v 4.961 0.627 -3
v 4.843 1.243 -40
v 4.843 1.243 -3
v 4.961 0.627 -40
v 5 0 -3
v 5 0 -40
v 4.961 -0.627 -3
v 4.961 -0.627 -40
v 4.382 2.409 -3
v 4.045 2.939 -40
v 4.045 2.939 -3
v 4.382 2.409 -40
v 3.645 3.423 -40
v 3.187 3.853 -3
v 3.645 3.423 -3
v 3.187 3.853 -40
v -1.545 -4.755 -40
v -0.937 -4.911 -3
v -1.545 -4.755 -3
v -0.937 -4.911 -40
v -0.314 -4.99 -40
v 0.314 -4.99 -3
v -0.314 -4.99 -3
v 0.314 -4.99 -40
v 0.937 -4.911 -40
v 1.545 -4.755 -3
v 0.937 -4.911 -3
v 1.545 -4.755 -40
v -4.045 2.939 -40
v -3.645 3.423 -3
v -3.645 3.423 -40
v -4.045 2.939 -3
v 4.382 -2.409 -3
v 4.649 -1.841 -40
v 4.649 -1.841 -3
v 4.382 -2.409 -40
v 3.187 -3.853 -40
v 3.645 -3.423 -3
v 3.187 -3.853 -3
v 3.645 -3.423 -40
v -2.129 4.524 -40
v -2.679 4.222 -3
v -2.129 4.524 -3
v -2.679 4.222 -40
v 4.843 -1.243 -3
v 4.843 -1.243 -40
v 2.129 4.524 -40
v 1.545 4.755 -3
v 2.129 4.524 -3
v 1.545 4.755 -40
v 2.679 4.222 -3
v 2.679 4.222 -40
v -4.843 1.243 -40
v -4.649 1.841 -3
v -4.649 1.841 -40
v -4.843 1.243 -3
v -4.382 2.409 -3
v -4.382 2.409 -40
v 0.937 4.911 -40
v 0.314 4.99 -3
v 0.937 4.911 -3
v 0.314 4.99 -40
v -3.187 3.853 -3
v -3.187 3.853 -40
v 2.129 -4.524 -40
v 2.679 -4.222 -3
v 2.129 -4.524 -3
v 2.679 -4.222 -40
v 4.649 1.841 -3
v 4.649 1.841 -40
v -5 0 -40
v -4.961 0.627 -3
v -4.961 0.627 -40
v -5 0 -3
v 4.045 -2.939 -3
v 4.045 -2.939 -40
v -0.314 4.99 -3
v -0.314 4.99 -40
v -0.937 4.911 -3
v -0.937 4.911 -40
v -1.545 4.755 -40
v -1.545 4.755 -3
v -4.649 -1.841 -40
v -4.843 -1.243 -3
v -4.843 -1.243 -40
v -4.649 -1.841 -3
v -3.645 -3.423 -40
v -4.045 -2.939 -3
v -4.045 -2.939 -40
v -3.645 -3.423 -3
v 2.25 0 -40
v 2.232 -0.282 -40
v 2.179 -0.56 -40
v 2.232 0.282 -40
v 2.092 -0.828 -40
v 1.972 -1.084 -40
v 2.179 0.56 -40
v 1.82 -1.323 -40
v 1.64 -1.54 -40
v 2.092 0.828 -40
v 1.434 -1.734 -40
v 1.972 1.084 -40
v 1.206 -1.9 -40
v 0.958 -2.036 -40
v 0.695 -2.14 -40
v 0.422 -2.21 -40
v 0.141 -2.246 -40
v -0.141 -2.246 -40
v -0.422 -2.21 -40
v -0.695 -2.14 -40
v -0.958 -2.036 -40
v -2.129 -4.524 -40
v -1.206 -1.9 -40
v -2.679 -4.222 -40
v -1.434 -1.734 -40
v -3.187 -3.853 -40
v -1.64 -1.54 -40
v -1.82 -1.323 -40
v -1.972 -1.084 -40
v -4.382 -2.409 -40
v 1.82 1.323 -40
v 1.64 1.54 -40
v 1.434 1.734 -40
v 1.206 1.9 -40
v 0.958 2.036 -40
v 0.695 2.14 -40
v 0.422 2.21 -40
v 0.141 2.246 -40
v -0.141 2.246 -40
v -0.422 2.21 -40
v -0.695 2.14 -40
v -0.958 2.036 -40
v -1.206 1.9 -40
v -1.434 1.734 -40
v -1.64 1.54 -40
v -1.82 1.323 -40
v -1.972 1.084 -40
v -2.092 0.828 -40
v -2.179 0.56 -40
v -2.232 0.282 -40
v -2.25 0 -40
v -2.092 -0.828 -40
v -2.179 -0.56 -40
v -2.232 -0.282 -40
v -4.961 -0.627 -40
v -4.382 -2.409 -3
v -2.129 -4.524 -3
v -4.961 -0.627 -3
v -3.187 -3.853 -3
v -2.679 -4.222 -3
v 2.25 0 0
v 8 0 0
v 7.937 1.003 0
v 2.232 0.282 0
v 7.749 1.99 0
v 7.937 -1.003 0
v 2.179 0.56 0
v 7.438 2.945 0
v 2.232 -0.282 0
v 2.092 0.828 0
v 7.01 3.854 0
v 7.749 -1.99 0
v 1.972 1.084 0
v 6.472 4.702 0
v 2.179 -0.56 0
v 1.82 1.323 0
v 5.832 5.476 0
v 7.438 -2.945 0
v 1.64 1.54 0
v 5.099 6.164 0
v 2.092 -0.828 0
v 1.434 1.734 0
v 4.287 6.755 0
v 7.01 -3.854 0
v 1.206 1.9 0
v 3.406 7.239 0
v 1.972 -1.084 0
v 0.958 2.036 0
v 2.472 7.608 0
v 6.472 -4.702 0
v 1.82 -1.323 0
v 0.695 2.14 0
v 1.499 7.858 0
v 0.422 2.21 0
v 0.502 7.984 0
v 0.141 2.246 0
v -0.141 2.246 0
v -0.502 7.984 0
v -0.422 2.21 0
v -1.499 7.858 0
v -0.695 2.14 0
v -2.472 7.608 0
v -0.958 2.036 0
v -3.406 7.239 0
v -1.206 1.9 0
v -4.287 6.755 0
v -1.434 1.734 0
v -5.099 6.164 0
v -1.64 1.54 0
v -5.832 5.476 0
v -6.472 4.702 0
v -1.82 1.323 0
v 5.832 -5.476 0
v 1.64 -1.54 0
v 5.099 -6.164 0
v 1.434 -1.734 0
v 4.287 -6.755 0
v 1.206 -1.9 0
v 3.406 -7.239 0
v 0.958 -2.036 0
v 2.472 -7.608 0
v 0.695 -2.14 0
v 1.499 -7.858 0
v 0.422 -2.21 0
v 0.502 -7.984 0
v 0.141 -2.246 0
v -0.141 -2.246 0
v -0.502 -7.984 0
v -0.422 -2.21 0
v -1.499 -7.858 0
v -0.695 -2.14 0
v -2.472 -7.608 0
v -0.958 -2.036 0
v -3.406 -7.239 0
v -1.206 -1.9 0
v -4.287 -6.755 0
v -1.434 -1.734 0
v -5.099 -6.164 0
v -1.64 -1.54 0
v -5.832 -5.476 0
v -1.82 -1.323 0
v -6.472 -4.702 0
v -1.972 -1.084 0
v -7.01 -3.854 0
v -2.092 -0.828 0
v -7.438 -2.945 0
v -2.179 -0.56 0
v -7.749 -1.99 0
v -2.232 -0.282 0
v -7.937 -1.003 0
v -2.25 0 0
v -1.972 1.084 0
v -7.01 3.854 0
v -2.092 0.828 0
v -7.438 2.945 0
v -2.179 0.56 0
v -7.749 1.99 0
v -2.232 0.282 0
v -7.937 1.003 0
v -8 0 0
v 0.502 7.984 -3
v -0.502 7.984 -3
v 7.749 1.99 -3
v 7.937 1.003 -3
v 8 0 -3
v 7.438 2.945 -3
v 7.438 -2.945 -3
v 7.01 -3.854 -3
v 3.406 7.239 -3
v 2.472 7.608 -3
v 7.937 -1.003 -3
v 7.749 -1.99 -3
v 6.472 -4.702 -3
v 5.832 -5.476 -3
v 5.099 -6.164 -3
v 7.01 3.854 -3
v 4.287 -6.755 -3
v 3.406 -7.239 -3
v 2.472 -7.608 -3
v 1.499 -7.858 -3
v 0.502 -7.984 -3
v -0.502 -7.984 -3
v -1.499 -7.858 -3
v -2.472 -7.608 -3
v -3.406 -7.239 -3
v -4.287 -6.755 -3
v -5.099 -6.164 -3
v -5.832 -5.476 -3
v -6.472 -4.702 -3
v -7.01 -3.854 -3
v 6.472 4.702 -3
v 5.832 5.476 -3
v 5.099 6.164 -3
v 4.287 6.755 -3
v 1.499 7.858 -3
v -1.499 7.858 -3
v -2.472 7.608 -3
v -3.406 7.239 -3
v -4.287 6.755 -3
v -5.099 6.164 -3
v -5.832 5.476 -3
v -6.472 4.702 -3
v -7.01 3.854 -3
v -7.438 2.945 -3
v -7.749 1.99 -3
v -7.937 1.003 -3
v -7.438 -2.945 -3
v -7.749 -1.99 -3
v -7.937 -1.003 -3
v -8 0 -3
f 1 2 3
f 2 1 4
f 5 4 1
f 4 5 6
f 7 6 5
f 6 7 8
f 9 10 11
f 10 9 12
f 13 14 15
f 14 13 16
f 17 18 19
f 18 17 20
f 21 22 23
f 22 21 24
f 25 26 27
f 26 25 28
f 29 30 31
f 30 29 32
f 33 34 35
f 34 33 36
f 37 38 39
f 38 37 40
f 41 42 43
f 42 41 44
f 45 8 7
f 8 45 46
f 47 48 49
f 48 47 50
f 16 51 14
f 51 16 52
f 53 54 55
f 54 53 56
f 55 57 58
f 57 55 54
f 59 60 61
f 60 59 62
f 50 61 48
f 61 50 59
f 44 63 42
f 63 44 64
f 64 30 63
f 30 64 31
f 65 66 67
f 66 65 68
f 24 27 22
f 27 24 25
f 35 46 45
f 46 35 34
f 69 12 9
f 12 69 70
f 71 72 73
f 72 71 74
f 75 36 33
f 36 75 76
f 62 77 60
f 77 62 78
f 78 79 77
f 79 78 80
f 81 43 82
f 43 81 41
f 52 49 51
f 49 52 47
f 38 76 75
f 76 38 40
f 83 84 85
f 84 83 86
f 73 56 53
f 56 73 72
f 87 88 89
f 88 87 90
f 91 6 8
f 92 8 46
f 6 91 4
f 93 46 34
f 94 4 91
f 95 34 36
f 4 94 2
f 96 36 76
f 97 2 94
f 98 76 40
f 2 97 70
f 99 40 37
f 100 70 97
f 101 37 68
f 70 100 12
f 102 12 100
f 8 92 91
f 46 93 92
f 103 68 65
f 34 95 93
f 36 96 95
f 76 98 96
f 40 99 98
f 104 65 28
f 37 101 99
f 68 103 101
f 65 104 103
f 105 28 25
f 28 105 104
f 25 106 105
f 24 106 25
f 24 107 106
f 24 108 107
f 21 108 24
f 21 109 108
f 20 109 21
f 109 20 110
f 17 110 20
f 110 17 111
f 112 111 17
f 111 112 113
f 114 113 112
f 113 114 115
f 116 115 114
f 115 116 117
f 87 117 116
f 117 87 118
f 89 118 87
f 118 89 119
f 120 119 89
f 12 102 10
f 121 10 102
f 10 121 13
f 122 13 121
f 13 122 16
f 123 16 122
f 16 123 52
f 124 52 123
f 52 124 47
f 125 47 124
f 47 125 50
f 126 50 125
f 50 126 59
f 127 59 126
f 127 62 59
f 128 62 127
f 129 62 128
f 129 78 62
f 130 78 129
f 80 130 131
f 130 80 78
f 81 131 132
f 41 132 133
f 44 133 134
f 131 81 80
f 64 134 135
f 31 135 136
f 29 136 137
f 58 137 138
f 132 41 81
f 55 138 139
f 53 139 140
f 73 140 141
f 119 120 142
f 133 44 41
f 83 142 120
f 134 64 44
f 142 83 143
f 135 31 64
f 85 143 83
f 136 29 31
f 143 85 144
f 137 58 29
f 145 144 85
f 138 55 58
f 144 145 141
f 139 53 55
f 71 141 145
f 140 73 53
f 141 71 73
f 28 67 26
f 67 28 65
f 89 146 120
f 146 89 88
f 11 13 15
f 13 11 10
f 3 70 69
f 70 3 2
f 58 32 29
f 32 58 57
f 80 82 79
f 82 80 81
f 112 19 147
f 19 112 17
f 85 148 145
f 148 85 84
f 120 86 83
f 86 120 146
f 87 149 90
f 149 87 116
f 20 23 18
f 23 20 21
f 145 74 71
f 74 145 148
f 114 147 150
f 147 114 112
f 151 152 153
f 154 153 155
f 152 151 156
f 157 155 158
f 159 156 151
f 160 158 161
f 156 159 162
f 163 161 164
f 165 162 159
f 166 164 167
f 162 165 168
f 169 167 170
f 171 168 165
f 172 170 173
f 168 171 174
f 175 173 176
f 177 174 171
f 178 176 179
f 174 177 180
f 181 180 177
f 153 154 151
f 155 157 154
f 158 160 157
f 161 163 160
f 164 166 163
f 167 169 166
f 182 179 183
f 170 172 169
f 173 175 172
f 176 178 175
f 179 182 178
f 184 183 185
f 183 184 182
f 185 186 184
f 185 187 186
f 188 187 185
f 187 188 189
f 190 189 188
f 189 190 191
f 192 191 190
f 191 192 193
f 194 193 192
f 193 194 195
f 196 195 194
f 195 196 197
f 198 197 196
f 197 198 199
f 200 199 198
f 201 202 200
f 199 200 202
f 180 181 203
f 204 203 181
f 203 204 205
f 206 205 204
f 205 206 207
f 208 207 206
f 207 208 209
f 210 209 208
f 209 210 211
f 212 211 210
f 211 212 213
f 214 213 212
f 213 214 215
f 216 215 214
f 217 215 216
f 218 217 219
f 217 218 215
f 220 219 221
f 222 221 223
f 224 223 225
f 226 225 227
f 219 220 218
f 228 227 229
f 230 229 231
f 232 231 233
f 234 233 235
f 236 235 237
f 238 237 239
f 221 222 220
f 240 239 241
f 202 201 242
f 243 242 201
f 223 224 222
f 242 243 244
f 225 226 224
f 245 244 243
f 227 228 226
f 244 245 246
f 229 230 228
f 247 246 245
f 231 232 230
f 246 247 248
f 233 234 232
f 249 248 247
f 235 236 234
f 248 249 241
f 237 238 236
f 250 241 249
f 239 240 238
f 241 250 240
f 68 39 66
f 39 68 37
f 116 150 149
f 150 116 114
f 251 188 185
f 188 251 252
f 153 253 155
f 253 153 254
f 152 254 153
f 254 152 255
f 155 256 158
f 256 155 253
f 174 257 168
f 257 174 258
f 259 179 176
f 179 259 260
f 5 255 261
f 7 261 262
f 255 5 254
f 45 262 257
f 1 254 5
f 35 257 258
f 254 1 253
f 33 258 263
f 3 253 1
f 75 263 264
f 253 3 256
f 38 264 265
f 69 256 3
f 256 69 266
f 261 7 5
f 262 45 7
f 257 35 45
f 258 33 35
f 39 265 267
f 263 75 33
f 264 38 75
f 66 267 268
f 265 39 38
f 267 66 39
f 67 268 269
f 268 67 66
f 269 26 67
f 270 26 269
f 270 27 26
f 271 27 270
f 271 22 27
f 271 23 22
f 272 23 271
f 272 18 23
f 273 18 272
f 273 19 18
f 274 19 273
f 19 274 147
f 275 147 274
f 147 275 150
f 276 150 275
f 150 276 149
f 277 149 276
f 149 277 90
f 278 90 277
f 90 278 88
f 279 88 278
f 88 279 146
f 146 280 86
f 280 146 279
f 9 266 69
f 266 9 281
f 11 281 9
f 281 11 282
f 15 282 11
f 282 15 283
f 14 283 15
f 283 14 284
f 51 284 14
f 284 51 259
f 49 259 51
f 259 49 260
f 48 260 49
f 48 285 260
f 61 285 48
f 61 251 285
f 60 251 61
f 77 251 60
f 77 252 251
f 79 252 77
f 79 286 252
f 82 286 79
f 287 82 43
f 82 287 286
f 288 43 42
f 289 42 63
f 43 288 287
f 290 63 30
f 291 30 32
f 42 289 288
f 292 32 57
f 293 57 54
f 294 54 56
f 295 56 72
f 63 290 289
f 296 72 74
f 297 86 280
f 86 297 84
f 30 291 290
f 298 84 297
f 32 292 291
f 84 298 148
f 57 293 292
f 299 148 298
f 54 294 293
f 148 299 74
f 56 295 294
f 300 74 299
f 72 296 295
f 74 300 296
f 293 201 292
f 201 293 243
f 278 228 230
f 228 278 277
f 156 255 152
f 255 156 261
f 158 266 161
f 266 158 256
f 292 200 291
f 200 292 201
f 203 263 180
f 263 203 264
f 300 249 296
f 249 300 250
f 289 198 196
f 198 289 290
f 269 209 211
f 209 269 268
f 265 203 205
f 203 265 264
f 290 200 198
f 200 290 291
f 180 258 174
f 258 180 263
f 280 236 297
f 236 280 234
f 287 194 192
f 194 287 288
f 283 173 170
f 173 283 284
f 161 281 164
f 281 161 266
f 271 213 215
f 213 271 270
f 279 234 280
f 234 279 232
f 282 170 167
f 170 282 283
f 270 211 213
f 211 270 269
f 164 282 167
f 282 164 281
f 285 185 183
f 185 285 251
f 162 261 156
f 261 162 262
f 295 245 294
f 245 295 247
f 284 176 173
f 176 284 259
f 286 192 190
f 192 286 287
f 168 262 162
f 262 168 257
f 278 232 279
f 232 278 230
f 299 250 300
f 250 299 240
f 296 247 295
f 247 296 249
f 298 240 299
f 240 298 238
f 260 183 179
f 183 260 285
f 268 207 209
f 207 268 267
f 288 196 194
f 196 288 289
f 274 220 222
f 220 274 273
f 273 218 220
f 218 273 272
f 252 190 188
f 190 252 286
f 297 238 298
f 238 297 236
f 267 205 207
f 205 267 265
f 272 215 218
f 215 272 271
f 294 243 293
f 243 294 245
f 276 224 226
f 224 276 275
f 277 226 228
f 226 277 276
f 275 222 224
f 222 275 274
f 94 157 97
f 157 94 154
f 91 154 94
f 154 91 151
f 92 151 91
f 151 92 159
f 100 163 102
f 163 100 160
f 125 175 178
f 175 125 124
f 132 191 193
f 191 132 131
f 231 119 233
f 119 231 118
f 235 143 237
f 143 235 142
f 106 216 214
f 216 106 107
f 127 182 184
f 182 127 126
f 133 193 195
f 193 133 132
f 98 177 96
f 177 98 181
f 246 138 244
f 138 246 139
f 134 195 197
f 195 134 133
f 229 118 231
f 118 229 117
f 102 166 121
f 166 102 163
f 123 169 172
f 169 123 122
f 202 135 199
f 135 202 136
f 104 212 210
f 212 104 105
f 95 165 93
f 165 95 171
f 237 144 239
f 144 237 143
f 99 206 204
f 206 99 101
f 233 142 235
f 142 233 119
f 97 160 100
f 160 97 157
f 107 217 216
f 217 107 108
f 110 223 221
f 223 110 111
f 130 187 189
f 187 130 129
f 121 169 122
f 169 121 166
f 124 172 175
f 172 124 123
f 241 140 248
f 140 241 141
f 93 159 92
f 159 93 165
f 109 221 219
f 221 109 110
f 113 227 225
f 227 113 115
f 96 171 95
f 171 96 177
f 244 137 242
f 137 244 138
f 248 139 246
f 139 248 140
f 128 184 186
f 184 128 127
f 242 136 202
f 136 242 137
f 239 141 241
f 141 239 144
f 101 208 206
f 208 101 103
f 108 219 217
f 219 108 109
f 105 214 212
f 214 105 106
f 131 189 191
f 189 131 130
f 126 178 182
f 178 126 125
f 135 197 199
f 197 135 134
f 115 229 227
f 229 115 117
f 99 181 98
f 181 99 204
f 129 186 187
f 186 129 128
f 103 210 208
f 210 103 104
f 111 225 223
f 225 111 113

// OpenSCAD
$fn = 50;


difference() {
	union() {
		translate(v = [0, 0, -40.0000000000]) {
			cylinder(h = 40, r = 5.0000000000);
		}
		translate(v = [0, 0, -3.0000000000]) {
			cylinder(h = 3, r = 8.0000000000);
		}
	}
	union() {
		#translate(v = [0, 0, -40]) {
			cylinder(h = 40, r = 2.2500000000);
		}
	}
}
